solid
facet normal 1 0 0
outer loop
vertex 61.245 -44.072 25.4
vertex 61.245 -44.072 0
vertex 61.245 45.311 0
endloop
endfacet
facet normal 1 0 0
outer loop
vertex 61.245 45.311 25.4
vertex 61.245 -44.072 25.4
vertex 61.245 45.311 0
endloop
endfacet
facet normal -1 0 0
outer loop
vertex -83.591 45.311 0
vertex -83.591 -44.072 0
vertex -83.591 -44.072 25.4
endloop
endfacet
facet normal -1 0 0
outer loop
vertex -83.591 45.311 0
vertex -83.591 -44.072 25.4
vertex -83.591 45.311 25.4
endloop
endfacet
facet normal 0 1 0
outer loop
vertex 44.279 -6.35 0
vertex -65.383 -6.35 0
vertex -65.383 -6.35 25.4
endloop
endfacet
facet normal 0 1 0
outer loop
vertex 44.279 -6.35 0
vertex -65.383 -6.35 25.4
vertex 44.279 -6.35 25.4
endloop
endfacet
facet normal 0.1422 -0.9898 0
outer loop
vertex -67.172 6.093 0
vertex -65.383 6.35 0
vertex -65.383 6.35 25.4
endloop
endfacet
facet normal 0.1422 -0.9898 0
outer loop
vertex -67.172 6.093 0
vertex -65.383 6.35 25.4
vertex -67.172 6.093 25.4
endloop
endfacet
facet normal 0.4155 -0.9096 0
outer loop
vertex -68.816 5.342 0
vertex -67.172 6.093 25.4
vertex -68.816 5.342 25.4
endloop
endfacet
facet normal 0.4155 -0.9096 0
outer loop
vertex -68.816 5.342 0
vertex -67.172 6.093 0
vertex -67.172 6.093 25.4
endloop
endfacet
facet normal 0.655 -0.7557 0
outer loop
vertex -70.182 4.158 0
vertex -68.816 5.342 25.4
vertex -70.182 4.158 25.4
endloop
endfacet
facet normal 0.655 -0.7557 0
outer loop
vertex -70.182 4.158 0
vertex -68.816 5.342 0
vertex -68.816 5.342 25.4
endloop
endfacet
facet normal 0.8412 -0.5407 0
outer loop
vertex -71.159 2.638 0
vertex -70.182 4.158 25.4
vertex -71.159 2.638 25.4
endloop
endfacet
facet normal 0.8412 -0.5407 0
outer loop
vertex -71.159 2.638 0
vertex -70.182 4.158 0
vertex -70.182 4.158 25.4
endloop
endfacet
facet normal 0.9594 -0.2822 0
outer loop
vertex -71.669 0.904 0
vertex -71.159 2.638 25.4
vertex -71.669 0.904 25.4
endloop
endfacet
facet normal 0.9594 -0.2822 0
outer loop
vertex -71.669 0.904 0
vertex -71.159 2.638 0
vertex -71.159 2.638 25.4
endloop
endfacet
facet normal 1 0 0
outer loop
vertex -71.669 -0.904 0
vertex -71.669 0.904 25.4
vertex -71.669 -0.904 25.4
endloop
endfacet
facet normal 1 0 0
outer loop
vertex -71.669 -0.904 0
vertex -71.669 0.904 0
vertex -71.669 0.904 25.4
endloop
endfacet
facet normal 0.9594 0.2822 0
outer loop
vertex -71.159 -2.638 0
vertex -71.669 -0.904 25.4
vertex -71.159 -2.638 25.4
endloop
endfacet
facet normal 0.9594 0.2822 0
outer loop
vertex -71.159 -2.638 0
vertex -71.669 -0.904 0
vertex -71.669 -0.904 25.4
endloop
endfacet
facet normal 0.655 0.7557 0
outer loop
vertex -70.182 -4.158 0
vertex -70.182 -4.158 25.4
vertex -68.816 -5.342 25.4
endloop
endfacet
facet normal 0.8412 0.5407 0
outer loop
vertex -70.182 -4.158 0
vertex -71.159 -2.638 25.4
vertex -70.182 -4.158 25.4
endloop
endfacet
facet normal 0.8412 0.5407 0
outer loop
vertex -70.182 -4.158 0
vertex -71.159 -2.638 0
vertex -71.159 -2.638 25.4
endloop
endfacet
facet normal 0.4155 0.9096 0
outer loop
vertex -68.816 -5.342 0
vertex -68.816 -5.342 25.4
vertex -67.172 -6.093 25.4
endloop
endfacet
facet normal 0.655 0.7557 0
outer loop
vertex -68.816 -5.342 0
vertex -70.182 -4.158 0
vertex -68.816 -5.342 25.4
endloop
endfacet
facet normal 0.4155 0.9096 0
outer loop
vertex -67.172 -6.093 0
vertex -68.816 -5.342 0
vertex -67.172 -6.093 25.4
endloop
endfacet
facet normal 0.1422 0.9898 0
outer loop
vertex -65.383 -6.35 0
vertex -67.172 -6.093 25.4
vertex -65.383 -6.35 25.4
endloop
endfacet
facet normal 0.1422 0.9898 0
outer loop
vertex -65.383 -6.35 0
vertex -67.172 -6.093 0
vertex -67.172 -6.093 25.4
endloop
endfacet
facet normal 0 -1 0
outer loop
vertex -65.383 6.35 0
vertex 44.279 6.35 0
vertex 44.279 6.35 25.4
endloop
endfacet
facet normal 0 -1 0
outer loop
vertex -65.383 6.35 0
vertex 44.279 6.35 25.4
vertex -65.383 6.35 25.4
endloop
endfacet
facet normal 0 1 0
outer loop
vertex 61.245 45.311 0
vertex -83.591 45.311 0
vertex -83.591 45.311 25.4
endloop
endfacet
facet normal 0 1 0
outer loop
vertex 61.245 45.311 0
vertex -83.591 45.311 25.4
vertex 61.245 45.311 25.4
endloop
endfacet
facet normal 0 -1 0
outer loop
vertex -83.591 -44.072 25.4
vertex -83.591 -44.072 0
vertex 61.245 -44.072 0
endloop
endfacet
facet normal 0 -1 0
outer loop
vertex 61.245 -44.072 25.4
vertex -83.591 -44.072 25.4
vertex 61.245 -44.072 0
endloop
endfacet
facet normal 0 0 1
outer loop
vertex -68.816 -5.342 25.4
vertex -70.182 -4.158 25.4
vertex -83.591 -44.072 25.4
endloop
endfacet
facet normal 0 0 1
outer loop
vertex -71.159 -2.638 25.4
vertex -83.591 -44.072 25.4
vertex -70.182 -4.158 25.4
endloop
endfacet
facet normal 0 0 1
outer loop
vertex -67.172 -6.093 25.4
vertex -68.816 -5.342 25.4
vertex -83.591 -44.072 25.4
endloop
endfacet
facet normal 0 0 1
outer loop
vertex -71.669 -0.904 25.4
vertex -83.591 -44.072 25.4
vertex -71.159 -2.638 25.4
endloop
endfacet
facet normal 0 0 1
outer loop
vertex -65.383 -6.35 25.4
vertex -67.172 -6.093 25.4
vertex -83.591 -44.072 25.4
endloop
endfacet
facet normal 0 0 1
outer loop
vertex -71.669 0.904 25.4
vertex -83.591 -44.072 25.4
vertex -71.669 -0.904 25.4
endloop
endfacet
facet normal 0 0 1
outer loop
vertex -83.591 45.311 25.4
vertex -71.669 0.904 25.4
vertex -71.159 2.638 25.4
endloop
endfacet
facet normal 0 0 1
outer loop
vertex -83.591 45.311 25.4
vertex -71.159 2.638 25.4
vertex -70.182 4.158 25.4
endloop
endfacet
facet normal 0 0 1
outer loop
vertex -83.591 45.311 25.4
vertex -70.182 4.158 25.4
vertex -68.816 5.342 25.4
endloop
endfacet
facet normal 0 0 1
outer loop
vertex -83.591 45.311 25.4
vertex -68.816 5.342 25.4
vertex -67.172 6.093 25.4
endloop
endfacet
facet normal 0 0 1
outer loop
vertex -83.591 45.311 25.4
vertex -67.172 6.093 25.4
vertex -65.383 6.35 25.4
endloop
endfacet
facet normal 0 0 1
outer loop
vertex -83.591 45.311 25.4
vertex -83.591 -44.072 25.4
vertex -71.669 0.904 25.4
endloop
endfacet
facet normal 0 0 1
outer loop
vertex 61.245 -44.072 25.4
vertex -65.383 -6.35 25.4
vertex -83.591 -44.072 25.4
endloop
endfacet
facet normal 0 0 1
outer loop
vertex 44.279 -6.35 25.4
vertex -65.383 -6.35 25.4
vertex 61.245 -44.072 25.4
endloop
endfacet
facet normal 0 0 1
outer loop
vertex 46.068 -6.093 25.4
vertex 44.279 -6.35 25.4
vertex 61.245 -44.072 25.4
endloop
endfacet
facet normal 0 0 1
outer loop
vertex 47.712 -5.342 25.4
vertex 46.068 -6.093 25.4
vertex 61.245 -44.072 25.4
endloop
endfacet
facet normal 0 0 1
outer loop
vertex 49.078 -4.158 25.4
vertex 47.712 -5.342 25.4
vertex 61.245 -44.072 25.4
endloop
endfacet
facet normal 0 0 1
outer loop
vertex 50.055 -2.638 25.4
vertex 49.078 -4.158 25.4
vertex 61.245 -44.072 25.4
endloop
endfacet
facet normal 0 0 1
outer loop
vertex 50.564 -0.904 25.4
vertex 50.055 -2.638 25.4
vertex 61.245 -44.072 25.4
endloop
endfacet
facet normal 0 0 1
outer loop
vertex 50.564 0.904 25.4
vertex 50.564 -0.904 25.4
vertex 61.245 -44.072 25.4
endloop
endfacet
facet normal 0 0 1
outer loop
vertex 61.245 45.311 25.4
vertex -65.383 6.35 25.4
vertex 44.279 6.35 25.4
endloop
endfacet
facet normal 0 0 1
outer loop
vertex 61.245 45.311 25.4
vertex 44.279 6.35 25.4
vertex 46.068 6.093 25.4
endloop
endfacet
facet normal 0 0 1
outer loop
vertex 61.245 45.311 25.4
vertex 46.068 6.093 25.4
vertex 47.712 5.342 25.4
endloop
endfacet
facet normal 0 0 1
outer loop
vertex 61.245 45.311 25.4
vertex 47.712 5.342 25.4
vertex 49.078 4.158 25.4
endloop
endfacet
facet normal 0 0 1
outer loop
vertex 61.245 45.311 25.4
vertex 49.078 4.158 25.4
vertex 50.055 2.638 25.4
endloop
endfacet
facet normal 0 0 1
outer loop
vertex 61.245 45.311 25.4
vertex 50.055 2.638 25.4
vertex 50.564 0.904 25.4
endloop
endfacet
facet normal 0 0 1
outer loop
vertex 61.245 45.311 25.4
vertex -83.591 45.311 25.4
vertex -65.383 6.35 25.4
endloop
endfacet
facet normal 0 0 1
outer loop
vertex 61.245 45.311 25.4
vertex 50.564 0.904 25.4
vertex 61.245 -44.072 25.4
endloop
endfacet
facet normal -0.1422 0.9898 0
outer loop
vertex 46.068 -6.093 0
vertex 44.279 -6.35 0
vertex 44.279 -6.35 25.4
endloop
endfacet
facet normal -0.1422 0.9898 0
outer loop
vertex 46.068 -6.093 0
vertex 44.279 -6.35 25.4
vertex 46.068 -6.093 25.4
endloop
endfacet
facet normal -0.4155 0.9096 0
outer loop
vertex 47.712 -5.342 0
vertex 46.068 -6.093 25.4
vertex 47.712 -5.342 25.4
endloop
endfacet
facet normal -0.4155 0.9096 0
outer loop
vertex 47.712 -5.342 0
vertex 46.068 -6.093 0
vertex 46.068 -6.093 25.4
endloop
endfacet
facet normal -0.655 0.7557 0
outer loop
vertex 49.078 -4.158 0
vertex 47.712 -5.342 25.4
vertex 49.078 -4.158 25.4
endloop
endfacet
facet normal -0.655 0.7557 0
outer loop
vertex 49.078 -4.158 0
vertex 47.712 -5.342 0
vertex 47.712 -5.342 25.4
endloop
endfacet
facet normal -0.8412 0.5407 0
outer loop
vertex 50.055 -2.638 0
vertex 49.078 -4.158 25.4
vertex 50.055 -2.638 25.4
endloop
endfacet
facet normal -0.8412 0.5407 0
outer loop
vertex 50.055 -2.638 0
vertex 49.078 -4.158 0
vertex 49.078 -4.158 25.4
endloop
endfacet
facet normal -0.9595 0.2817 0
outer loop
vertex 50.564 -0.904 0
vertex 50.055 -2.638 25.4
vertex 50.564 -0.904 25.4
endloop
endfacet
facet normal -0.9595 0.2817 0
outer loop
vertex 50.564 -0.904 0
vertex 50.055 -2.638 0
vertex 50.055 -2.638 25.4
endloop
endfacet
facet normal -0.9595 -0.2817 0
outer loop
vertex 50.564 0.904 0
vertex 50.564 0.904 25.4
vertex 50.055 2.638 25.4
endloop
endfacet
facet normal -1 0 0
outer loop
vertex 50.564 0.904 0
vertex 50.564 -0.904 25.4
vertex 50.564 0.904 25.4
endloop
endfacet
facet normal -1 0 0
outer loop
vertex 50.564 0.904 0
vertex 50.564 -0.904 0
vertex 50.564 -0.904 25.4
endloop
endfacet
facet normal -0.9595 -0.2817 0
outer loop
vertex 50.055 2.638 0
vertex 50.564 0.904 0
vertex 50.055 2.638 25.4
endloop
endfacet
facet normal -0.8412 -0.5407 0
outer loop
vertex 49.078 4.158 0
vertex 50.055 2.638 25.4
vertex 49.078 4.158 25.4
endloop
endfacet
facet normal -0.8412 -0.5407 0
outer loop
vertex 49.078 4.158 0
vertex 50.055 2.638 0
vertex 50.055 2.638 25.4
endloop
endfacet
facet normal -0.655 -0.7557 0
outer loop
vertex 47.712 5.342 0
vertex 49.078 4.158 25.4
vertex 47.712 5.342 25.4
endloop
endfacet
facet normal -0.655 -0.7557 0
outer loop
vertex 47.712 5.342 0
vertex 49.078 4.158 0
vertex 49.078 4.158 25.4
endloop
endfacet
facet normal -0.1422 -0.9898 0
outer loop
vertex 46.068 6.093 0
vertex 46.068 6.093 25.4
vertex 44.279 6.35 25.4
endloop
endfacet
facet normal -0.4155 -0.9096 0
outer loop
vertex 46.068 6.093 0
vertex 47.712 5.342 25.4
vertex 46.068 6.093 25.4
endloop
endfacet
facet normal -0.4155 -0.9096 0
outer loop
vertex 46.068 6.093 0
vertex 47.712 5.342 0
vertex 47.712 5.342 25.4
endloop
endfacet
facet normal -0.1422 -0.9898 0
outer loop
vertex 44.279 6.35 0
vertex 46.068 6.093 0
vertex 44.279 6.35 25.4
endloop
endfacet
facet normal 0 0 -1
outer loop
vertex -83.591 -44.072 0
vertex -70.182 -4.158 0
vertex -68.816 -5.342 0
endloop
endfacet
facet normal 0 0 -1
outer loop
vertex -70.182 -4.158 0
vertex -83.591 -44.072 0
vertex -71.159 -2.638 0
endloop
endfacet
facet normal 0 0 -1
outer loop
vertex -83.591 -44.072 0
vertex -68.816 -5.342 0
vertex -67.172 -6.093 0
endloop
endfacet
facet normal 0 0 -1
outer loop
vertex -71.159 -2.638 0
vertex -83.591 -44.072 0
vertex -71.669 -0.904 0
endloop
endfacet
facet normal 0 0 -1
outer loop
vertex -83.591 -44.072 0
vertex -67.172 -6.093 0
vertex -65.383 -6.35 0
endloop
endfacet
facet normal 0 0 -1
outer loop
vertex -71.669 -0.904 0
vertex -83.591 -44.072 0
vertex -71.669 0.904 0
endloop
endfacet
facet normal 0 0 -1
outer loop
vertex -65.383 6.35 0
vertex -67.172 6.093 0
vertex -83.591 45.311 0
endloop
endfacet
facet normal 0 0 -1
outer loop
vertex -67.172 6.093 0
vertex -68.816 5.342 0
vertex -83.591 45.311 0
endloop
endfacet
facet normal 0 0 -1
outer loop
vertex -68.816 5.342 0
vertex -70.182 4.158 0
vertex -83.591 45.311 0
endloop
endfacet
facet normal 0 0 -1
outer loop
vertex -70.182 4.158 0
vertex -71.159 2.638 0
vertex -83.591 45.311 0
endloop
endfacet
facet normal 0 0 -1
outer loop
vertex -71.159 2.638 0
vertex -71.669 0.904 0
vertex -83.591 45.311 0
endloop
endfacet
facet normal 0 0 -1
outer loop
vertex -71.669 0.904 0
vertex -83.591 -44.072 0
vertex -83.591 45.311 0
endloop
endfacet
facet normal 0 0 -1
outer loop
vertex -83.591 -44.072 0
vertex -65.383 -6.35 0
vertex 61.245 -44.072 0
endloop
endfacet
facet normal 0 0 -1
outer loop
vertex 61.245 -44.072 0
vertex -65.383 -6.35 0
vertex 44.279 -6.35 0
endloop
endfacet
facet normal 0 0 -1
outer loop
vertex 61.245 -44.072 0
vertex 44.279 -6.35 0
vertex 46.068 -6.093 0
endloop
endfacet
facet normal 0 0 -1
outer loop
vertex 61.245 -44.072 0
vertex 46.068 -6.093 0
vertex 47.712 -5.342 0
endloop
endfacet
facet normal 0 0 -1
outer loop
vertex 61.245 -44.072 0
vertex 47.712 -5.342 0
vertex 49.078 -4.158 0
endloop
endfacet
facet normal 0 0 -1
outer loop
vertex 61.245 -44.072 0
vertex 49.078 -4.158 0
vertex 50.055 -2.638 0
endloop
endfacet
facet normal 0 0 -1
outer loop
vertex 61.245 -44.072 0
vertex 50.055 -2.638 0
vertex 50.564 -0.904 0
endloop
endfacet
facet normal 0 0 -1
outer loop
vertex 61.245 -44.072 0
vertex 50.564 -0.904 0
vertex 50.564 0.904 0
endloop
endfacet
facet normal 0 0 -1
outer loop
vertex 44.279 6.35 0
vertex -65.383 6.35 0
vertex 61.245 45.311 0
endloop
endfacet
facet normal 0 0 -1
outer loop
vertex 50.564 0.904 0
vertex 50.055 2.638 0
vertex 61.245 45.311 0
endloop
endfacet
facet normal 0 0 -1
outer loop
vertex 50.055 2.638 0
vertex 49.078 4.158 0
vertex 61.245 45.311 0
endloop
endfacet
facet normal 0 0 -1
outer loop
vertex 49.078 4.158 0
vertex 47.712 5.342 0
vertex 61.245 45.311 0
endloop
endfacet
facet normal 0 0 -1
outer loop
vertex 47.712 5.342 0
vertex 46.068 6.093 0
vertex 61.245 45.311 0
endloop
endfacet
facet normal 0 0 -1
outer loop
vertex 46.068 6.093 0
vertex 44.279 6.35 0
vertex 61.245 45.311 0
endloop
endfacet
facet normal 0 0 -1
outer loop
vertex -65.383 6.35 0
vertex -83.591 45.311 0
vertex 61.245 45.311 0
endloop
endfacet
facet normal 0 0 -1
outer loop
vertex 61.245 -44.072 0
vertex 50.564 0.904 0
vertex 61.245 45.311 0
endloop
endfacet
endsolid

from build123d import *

# Parameters (mm, degrees)
F0_W     = 144.836355
F0_H     = 89.3826
F2_DEPTH = 25.4
F3_DEPTH = 25.401


with BuildPart() as f2:
    # F0 (on Top) → F2 (new body)
    with BuildSketch(Plane.XY):
        with Locations((-11.173098, 0.619659)):
            Rectangle(F0_W, F0_H)
    extrude(amount=F2_DEPTH)

    # F1 (on Top) → F3 (cut, through all)
    with BuildSketch(Plane.XY):
        with BuildLine():
            ThreePointArc((-65.383278, 6.35), (-71.733278, 0), (-65.383278, -6.35))
            Line((-65.383278, -6.35), (44.27854, -6.35))
            ThreePointArc((44.27854, -6.35), (50.62854, 0), (44.27854, 6.35))
            Line((44.27854, 6.35), (-65.383278, 6.35))
        make_face()
    extrude(amount=F3_DEPTH, mode=Mode.SUBTRACT)


solid = f2.part
